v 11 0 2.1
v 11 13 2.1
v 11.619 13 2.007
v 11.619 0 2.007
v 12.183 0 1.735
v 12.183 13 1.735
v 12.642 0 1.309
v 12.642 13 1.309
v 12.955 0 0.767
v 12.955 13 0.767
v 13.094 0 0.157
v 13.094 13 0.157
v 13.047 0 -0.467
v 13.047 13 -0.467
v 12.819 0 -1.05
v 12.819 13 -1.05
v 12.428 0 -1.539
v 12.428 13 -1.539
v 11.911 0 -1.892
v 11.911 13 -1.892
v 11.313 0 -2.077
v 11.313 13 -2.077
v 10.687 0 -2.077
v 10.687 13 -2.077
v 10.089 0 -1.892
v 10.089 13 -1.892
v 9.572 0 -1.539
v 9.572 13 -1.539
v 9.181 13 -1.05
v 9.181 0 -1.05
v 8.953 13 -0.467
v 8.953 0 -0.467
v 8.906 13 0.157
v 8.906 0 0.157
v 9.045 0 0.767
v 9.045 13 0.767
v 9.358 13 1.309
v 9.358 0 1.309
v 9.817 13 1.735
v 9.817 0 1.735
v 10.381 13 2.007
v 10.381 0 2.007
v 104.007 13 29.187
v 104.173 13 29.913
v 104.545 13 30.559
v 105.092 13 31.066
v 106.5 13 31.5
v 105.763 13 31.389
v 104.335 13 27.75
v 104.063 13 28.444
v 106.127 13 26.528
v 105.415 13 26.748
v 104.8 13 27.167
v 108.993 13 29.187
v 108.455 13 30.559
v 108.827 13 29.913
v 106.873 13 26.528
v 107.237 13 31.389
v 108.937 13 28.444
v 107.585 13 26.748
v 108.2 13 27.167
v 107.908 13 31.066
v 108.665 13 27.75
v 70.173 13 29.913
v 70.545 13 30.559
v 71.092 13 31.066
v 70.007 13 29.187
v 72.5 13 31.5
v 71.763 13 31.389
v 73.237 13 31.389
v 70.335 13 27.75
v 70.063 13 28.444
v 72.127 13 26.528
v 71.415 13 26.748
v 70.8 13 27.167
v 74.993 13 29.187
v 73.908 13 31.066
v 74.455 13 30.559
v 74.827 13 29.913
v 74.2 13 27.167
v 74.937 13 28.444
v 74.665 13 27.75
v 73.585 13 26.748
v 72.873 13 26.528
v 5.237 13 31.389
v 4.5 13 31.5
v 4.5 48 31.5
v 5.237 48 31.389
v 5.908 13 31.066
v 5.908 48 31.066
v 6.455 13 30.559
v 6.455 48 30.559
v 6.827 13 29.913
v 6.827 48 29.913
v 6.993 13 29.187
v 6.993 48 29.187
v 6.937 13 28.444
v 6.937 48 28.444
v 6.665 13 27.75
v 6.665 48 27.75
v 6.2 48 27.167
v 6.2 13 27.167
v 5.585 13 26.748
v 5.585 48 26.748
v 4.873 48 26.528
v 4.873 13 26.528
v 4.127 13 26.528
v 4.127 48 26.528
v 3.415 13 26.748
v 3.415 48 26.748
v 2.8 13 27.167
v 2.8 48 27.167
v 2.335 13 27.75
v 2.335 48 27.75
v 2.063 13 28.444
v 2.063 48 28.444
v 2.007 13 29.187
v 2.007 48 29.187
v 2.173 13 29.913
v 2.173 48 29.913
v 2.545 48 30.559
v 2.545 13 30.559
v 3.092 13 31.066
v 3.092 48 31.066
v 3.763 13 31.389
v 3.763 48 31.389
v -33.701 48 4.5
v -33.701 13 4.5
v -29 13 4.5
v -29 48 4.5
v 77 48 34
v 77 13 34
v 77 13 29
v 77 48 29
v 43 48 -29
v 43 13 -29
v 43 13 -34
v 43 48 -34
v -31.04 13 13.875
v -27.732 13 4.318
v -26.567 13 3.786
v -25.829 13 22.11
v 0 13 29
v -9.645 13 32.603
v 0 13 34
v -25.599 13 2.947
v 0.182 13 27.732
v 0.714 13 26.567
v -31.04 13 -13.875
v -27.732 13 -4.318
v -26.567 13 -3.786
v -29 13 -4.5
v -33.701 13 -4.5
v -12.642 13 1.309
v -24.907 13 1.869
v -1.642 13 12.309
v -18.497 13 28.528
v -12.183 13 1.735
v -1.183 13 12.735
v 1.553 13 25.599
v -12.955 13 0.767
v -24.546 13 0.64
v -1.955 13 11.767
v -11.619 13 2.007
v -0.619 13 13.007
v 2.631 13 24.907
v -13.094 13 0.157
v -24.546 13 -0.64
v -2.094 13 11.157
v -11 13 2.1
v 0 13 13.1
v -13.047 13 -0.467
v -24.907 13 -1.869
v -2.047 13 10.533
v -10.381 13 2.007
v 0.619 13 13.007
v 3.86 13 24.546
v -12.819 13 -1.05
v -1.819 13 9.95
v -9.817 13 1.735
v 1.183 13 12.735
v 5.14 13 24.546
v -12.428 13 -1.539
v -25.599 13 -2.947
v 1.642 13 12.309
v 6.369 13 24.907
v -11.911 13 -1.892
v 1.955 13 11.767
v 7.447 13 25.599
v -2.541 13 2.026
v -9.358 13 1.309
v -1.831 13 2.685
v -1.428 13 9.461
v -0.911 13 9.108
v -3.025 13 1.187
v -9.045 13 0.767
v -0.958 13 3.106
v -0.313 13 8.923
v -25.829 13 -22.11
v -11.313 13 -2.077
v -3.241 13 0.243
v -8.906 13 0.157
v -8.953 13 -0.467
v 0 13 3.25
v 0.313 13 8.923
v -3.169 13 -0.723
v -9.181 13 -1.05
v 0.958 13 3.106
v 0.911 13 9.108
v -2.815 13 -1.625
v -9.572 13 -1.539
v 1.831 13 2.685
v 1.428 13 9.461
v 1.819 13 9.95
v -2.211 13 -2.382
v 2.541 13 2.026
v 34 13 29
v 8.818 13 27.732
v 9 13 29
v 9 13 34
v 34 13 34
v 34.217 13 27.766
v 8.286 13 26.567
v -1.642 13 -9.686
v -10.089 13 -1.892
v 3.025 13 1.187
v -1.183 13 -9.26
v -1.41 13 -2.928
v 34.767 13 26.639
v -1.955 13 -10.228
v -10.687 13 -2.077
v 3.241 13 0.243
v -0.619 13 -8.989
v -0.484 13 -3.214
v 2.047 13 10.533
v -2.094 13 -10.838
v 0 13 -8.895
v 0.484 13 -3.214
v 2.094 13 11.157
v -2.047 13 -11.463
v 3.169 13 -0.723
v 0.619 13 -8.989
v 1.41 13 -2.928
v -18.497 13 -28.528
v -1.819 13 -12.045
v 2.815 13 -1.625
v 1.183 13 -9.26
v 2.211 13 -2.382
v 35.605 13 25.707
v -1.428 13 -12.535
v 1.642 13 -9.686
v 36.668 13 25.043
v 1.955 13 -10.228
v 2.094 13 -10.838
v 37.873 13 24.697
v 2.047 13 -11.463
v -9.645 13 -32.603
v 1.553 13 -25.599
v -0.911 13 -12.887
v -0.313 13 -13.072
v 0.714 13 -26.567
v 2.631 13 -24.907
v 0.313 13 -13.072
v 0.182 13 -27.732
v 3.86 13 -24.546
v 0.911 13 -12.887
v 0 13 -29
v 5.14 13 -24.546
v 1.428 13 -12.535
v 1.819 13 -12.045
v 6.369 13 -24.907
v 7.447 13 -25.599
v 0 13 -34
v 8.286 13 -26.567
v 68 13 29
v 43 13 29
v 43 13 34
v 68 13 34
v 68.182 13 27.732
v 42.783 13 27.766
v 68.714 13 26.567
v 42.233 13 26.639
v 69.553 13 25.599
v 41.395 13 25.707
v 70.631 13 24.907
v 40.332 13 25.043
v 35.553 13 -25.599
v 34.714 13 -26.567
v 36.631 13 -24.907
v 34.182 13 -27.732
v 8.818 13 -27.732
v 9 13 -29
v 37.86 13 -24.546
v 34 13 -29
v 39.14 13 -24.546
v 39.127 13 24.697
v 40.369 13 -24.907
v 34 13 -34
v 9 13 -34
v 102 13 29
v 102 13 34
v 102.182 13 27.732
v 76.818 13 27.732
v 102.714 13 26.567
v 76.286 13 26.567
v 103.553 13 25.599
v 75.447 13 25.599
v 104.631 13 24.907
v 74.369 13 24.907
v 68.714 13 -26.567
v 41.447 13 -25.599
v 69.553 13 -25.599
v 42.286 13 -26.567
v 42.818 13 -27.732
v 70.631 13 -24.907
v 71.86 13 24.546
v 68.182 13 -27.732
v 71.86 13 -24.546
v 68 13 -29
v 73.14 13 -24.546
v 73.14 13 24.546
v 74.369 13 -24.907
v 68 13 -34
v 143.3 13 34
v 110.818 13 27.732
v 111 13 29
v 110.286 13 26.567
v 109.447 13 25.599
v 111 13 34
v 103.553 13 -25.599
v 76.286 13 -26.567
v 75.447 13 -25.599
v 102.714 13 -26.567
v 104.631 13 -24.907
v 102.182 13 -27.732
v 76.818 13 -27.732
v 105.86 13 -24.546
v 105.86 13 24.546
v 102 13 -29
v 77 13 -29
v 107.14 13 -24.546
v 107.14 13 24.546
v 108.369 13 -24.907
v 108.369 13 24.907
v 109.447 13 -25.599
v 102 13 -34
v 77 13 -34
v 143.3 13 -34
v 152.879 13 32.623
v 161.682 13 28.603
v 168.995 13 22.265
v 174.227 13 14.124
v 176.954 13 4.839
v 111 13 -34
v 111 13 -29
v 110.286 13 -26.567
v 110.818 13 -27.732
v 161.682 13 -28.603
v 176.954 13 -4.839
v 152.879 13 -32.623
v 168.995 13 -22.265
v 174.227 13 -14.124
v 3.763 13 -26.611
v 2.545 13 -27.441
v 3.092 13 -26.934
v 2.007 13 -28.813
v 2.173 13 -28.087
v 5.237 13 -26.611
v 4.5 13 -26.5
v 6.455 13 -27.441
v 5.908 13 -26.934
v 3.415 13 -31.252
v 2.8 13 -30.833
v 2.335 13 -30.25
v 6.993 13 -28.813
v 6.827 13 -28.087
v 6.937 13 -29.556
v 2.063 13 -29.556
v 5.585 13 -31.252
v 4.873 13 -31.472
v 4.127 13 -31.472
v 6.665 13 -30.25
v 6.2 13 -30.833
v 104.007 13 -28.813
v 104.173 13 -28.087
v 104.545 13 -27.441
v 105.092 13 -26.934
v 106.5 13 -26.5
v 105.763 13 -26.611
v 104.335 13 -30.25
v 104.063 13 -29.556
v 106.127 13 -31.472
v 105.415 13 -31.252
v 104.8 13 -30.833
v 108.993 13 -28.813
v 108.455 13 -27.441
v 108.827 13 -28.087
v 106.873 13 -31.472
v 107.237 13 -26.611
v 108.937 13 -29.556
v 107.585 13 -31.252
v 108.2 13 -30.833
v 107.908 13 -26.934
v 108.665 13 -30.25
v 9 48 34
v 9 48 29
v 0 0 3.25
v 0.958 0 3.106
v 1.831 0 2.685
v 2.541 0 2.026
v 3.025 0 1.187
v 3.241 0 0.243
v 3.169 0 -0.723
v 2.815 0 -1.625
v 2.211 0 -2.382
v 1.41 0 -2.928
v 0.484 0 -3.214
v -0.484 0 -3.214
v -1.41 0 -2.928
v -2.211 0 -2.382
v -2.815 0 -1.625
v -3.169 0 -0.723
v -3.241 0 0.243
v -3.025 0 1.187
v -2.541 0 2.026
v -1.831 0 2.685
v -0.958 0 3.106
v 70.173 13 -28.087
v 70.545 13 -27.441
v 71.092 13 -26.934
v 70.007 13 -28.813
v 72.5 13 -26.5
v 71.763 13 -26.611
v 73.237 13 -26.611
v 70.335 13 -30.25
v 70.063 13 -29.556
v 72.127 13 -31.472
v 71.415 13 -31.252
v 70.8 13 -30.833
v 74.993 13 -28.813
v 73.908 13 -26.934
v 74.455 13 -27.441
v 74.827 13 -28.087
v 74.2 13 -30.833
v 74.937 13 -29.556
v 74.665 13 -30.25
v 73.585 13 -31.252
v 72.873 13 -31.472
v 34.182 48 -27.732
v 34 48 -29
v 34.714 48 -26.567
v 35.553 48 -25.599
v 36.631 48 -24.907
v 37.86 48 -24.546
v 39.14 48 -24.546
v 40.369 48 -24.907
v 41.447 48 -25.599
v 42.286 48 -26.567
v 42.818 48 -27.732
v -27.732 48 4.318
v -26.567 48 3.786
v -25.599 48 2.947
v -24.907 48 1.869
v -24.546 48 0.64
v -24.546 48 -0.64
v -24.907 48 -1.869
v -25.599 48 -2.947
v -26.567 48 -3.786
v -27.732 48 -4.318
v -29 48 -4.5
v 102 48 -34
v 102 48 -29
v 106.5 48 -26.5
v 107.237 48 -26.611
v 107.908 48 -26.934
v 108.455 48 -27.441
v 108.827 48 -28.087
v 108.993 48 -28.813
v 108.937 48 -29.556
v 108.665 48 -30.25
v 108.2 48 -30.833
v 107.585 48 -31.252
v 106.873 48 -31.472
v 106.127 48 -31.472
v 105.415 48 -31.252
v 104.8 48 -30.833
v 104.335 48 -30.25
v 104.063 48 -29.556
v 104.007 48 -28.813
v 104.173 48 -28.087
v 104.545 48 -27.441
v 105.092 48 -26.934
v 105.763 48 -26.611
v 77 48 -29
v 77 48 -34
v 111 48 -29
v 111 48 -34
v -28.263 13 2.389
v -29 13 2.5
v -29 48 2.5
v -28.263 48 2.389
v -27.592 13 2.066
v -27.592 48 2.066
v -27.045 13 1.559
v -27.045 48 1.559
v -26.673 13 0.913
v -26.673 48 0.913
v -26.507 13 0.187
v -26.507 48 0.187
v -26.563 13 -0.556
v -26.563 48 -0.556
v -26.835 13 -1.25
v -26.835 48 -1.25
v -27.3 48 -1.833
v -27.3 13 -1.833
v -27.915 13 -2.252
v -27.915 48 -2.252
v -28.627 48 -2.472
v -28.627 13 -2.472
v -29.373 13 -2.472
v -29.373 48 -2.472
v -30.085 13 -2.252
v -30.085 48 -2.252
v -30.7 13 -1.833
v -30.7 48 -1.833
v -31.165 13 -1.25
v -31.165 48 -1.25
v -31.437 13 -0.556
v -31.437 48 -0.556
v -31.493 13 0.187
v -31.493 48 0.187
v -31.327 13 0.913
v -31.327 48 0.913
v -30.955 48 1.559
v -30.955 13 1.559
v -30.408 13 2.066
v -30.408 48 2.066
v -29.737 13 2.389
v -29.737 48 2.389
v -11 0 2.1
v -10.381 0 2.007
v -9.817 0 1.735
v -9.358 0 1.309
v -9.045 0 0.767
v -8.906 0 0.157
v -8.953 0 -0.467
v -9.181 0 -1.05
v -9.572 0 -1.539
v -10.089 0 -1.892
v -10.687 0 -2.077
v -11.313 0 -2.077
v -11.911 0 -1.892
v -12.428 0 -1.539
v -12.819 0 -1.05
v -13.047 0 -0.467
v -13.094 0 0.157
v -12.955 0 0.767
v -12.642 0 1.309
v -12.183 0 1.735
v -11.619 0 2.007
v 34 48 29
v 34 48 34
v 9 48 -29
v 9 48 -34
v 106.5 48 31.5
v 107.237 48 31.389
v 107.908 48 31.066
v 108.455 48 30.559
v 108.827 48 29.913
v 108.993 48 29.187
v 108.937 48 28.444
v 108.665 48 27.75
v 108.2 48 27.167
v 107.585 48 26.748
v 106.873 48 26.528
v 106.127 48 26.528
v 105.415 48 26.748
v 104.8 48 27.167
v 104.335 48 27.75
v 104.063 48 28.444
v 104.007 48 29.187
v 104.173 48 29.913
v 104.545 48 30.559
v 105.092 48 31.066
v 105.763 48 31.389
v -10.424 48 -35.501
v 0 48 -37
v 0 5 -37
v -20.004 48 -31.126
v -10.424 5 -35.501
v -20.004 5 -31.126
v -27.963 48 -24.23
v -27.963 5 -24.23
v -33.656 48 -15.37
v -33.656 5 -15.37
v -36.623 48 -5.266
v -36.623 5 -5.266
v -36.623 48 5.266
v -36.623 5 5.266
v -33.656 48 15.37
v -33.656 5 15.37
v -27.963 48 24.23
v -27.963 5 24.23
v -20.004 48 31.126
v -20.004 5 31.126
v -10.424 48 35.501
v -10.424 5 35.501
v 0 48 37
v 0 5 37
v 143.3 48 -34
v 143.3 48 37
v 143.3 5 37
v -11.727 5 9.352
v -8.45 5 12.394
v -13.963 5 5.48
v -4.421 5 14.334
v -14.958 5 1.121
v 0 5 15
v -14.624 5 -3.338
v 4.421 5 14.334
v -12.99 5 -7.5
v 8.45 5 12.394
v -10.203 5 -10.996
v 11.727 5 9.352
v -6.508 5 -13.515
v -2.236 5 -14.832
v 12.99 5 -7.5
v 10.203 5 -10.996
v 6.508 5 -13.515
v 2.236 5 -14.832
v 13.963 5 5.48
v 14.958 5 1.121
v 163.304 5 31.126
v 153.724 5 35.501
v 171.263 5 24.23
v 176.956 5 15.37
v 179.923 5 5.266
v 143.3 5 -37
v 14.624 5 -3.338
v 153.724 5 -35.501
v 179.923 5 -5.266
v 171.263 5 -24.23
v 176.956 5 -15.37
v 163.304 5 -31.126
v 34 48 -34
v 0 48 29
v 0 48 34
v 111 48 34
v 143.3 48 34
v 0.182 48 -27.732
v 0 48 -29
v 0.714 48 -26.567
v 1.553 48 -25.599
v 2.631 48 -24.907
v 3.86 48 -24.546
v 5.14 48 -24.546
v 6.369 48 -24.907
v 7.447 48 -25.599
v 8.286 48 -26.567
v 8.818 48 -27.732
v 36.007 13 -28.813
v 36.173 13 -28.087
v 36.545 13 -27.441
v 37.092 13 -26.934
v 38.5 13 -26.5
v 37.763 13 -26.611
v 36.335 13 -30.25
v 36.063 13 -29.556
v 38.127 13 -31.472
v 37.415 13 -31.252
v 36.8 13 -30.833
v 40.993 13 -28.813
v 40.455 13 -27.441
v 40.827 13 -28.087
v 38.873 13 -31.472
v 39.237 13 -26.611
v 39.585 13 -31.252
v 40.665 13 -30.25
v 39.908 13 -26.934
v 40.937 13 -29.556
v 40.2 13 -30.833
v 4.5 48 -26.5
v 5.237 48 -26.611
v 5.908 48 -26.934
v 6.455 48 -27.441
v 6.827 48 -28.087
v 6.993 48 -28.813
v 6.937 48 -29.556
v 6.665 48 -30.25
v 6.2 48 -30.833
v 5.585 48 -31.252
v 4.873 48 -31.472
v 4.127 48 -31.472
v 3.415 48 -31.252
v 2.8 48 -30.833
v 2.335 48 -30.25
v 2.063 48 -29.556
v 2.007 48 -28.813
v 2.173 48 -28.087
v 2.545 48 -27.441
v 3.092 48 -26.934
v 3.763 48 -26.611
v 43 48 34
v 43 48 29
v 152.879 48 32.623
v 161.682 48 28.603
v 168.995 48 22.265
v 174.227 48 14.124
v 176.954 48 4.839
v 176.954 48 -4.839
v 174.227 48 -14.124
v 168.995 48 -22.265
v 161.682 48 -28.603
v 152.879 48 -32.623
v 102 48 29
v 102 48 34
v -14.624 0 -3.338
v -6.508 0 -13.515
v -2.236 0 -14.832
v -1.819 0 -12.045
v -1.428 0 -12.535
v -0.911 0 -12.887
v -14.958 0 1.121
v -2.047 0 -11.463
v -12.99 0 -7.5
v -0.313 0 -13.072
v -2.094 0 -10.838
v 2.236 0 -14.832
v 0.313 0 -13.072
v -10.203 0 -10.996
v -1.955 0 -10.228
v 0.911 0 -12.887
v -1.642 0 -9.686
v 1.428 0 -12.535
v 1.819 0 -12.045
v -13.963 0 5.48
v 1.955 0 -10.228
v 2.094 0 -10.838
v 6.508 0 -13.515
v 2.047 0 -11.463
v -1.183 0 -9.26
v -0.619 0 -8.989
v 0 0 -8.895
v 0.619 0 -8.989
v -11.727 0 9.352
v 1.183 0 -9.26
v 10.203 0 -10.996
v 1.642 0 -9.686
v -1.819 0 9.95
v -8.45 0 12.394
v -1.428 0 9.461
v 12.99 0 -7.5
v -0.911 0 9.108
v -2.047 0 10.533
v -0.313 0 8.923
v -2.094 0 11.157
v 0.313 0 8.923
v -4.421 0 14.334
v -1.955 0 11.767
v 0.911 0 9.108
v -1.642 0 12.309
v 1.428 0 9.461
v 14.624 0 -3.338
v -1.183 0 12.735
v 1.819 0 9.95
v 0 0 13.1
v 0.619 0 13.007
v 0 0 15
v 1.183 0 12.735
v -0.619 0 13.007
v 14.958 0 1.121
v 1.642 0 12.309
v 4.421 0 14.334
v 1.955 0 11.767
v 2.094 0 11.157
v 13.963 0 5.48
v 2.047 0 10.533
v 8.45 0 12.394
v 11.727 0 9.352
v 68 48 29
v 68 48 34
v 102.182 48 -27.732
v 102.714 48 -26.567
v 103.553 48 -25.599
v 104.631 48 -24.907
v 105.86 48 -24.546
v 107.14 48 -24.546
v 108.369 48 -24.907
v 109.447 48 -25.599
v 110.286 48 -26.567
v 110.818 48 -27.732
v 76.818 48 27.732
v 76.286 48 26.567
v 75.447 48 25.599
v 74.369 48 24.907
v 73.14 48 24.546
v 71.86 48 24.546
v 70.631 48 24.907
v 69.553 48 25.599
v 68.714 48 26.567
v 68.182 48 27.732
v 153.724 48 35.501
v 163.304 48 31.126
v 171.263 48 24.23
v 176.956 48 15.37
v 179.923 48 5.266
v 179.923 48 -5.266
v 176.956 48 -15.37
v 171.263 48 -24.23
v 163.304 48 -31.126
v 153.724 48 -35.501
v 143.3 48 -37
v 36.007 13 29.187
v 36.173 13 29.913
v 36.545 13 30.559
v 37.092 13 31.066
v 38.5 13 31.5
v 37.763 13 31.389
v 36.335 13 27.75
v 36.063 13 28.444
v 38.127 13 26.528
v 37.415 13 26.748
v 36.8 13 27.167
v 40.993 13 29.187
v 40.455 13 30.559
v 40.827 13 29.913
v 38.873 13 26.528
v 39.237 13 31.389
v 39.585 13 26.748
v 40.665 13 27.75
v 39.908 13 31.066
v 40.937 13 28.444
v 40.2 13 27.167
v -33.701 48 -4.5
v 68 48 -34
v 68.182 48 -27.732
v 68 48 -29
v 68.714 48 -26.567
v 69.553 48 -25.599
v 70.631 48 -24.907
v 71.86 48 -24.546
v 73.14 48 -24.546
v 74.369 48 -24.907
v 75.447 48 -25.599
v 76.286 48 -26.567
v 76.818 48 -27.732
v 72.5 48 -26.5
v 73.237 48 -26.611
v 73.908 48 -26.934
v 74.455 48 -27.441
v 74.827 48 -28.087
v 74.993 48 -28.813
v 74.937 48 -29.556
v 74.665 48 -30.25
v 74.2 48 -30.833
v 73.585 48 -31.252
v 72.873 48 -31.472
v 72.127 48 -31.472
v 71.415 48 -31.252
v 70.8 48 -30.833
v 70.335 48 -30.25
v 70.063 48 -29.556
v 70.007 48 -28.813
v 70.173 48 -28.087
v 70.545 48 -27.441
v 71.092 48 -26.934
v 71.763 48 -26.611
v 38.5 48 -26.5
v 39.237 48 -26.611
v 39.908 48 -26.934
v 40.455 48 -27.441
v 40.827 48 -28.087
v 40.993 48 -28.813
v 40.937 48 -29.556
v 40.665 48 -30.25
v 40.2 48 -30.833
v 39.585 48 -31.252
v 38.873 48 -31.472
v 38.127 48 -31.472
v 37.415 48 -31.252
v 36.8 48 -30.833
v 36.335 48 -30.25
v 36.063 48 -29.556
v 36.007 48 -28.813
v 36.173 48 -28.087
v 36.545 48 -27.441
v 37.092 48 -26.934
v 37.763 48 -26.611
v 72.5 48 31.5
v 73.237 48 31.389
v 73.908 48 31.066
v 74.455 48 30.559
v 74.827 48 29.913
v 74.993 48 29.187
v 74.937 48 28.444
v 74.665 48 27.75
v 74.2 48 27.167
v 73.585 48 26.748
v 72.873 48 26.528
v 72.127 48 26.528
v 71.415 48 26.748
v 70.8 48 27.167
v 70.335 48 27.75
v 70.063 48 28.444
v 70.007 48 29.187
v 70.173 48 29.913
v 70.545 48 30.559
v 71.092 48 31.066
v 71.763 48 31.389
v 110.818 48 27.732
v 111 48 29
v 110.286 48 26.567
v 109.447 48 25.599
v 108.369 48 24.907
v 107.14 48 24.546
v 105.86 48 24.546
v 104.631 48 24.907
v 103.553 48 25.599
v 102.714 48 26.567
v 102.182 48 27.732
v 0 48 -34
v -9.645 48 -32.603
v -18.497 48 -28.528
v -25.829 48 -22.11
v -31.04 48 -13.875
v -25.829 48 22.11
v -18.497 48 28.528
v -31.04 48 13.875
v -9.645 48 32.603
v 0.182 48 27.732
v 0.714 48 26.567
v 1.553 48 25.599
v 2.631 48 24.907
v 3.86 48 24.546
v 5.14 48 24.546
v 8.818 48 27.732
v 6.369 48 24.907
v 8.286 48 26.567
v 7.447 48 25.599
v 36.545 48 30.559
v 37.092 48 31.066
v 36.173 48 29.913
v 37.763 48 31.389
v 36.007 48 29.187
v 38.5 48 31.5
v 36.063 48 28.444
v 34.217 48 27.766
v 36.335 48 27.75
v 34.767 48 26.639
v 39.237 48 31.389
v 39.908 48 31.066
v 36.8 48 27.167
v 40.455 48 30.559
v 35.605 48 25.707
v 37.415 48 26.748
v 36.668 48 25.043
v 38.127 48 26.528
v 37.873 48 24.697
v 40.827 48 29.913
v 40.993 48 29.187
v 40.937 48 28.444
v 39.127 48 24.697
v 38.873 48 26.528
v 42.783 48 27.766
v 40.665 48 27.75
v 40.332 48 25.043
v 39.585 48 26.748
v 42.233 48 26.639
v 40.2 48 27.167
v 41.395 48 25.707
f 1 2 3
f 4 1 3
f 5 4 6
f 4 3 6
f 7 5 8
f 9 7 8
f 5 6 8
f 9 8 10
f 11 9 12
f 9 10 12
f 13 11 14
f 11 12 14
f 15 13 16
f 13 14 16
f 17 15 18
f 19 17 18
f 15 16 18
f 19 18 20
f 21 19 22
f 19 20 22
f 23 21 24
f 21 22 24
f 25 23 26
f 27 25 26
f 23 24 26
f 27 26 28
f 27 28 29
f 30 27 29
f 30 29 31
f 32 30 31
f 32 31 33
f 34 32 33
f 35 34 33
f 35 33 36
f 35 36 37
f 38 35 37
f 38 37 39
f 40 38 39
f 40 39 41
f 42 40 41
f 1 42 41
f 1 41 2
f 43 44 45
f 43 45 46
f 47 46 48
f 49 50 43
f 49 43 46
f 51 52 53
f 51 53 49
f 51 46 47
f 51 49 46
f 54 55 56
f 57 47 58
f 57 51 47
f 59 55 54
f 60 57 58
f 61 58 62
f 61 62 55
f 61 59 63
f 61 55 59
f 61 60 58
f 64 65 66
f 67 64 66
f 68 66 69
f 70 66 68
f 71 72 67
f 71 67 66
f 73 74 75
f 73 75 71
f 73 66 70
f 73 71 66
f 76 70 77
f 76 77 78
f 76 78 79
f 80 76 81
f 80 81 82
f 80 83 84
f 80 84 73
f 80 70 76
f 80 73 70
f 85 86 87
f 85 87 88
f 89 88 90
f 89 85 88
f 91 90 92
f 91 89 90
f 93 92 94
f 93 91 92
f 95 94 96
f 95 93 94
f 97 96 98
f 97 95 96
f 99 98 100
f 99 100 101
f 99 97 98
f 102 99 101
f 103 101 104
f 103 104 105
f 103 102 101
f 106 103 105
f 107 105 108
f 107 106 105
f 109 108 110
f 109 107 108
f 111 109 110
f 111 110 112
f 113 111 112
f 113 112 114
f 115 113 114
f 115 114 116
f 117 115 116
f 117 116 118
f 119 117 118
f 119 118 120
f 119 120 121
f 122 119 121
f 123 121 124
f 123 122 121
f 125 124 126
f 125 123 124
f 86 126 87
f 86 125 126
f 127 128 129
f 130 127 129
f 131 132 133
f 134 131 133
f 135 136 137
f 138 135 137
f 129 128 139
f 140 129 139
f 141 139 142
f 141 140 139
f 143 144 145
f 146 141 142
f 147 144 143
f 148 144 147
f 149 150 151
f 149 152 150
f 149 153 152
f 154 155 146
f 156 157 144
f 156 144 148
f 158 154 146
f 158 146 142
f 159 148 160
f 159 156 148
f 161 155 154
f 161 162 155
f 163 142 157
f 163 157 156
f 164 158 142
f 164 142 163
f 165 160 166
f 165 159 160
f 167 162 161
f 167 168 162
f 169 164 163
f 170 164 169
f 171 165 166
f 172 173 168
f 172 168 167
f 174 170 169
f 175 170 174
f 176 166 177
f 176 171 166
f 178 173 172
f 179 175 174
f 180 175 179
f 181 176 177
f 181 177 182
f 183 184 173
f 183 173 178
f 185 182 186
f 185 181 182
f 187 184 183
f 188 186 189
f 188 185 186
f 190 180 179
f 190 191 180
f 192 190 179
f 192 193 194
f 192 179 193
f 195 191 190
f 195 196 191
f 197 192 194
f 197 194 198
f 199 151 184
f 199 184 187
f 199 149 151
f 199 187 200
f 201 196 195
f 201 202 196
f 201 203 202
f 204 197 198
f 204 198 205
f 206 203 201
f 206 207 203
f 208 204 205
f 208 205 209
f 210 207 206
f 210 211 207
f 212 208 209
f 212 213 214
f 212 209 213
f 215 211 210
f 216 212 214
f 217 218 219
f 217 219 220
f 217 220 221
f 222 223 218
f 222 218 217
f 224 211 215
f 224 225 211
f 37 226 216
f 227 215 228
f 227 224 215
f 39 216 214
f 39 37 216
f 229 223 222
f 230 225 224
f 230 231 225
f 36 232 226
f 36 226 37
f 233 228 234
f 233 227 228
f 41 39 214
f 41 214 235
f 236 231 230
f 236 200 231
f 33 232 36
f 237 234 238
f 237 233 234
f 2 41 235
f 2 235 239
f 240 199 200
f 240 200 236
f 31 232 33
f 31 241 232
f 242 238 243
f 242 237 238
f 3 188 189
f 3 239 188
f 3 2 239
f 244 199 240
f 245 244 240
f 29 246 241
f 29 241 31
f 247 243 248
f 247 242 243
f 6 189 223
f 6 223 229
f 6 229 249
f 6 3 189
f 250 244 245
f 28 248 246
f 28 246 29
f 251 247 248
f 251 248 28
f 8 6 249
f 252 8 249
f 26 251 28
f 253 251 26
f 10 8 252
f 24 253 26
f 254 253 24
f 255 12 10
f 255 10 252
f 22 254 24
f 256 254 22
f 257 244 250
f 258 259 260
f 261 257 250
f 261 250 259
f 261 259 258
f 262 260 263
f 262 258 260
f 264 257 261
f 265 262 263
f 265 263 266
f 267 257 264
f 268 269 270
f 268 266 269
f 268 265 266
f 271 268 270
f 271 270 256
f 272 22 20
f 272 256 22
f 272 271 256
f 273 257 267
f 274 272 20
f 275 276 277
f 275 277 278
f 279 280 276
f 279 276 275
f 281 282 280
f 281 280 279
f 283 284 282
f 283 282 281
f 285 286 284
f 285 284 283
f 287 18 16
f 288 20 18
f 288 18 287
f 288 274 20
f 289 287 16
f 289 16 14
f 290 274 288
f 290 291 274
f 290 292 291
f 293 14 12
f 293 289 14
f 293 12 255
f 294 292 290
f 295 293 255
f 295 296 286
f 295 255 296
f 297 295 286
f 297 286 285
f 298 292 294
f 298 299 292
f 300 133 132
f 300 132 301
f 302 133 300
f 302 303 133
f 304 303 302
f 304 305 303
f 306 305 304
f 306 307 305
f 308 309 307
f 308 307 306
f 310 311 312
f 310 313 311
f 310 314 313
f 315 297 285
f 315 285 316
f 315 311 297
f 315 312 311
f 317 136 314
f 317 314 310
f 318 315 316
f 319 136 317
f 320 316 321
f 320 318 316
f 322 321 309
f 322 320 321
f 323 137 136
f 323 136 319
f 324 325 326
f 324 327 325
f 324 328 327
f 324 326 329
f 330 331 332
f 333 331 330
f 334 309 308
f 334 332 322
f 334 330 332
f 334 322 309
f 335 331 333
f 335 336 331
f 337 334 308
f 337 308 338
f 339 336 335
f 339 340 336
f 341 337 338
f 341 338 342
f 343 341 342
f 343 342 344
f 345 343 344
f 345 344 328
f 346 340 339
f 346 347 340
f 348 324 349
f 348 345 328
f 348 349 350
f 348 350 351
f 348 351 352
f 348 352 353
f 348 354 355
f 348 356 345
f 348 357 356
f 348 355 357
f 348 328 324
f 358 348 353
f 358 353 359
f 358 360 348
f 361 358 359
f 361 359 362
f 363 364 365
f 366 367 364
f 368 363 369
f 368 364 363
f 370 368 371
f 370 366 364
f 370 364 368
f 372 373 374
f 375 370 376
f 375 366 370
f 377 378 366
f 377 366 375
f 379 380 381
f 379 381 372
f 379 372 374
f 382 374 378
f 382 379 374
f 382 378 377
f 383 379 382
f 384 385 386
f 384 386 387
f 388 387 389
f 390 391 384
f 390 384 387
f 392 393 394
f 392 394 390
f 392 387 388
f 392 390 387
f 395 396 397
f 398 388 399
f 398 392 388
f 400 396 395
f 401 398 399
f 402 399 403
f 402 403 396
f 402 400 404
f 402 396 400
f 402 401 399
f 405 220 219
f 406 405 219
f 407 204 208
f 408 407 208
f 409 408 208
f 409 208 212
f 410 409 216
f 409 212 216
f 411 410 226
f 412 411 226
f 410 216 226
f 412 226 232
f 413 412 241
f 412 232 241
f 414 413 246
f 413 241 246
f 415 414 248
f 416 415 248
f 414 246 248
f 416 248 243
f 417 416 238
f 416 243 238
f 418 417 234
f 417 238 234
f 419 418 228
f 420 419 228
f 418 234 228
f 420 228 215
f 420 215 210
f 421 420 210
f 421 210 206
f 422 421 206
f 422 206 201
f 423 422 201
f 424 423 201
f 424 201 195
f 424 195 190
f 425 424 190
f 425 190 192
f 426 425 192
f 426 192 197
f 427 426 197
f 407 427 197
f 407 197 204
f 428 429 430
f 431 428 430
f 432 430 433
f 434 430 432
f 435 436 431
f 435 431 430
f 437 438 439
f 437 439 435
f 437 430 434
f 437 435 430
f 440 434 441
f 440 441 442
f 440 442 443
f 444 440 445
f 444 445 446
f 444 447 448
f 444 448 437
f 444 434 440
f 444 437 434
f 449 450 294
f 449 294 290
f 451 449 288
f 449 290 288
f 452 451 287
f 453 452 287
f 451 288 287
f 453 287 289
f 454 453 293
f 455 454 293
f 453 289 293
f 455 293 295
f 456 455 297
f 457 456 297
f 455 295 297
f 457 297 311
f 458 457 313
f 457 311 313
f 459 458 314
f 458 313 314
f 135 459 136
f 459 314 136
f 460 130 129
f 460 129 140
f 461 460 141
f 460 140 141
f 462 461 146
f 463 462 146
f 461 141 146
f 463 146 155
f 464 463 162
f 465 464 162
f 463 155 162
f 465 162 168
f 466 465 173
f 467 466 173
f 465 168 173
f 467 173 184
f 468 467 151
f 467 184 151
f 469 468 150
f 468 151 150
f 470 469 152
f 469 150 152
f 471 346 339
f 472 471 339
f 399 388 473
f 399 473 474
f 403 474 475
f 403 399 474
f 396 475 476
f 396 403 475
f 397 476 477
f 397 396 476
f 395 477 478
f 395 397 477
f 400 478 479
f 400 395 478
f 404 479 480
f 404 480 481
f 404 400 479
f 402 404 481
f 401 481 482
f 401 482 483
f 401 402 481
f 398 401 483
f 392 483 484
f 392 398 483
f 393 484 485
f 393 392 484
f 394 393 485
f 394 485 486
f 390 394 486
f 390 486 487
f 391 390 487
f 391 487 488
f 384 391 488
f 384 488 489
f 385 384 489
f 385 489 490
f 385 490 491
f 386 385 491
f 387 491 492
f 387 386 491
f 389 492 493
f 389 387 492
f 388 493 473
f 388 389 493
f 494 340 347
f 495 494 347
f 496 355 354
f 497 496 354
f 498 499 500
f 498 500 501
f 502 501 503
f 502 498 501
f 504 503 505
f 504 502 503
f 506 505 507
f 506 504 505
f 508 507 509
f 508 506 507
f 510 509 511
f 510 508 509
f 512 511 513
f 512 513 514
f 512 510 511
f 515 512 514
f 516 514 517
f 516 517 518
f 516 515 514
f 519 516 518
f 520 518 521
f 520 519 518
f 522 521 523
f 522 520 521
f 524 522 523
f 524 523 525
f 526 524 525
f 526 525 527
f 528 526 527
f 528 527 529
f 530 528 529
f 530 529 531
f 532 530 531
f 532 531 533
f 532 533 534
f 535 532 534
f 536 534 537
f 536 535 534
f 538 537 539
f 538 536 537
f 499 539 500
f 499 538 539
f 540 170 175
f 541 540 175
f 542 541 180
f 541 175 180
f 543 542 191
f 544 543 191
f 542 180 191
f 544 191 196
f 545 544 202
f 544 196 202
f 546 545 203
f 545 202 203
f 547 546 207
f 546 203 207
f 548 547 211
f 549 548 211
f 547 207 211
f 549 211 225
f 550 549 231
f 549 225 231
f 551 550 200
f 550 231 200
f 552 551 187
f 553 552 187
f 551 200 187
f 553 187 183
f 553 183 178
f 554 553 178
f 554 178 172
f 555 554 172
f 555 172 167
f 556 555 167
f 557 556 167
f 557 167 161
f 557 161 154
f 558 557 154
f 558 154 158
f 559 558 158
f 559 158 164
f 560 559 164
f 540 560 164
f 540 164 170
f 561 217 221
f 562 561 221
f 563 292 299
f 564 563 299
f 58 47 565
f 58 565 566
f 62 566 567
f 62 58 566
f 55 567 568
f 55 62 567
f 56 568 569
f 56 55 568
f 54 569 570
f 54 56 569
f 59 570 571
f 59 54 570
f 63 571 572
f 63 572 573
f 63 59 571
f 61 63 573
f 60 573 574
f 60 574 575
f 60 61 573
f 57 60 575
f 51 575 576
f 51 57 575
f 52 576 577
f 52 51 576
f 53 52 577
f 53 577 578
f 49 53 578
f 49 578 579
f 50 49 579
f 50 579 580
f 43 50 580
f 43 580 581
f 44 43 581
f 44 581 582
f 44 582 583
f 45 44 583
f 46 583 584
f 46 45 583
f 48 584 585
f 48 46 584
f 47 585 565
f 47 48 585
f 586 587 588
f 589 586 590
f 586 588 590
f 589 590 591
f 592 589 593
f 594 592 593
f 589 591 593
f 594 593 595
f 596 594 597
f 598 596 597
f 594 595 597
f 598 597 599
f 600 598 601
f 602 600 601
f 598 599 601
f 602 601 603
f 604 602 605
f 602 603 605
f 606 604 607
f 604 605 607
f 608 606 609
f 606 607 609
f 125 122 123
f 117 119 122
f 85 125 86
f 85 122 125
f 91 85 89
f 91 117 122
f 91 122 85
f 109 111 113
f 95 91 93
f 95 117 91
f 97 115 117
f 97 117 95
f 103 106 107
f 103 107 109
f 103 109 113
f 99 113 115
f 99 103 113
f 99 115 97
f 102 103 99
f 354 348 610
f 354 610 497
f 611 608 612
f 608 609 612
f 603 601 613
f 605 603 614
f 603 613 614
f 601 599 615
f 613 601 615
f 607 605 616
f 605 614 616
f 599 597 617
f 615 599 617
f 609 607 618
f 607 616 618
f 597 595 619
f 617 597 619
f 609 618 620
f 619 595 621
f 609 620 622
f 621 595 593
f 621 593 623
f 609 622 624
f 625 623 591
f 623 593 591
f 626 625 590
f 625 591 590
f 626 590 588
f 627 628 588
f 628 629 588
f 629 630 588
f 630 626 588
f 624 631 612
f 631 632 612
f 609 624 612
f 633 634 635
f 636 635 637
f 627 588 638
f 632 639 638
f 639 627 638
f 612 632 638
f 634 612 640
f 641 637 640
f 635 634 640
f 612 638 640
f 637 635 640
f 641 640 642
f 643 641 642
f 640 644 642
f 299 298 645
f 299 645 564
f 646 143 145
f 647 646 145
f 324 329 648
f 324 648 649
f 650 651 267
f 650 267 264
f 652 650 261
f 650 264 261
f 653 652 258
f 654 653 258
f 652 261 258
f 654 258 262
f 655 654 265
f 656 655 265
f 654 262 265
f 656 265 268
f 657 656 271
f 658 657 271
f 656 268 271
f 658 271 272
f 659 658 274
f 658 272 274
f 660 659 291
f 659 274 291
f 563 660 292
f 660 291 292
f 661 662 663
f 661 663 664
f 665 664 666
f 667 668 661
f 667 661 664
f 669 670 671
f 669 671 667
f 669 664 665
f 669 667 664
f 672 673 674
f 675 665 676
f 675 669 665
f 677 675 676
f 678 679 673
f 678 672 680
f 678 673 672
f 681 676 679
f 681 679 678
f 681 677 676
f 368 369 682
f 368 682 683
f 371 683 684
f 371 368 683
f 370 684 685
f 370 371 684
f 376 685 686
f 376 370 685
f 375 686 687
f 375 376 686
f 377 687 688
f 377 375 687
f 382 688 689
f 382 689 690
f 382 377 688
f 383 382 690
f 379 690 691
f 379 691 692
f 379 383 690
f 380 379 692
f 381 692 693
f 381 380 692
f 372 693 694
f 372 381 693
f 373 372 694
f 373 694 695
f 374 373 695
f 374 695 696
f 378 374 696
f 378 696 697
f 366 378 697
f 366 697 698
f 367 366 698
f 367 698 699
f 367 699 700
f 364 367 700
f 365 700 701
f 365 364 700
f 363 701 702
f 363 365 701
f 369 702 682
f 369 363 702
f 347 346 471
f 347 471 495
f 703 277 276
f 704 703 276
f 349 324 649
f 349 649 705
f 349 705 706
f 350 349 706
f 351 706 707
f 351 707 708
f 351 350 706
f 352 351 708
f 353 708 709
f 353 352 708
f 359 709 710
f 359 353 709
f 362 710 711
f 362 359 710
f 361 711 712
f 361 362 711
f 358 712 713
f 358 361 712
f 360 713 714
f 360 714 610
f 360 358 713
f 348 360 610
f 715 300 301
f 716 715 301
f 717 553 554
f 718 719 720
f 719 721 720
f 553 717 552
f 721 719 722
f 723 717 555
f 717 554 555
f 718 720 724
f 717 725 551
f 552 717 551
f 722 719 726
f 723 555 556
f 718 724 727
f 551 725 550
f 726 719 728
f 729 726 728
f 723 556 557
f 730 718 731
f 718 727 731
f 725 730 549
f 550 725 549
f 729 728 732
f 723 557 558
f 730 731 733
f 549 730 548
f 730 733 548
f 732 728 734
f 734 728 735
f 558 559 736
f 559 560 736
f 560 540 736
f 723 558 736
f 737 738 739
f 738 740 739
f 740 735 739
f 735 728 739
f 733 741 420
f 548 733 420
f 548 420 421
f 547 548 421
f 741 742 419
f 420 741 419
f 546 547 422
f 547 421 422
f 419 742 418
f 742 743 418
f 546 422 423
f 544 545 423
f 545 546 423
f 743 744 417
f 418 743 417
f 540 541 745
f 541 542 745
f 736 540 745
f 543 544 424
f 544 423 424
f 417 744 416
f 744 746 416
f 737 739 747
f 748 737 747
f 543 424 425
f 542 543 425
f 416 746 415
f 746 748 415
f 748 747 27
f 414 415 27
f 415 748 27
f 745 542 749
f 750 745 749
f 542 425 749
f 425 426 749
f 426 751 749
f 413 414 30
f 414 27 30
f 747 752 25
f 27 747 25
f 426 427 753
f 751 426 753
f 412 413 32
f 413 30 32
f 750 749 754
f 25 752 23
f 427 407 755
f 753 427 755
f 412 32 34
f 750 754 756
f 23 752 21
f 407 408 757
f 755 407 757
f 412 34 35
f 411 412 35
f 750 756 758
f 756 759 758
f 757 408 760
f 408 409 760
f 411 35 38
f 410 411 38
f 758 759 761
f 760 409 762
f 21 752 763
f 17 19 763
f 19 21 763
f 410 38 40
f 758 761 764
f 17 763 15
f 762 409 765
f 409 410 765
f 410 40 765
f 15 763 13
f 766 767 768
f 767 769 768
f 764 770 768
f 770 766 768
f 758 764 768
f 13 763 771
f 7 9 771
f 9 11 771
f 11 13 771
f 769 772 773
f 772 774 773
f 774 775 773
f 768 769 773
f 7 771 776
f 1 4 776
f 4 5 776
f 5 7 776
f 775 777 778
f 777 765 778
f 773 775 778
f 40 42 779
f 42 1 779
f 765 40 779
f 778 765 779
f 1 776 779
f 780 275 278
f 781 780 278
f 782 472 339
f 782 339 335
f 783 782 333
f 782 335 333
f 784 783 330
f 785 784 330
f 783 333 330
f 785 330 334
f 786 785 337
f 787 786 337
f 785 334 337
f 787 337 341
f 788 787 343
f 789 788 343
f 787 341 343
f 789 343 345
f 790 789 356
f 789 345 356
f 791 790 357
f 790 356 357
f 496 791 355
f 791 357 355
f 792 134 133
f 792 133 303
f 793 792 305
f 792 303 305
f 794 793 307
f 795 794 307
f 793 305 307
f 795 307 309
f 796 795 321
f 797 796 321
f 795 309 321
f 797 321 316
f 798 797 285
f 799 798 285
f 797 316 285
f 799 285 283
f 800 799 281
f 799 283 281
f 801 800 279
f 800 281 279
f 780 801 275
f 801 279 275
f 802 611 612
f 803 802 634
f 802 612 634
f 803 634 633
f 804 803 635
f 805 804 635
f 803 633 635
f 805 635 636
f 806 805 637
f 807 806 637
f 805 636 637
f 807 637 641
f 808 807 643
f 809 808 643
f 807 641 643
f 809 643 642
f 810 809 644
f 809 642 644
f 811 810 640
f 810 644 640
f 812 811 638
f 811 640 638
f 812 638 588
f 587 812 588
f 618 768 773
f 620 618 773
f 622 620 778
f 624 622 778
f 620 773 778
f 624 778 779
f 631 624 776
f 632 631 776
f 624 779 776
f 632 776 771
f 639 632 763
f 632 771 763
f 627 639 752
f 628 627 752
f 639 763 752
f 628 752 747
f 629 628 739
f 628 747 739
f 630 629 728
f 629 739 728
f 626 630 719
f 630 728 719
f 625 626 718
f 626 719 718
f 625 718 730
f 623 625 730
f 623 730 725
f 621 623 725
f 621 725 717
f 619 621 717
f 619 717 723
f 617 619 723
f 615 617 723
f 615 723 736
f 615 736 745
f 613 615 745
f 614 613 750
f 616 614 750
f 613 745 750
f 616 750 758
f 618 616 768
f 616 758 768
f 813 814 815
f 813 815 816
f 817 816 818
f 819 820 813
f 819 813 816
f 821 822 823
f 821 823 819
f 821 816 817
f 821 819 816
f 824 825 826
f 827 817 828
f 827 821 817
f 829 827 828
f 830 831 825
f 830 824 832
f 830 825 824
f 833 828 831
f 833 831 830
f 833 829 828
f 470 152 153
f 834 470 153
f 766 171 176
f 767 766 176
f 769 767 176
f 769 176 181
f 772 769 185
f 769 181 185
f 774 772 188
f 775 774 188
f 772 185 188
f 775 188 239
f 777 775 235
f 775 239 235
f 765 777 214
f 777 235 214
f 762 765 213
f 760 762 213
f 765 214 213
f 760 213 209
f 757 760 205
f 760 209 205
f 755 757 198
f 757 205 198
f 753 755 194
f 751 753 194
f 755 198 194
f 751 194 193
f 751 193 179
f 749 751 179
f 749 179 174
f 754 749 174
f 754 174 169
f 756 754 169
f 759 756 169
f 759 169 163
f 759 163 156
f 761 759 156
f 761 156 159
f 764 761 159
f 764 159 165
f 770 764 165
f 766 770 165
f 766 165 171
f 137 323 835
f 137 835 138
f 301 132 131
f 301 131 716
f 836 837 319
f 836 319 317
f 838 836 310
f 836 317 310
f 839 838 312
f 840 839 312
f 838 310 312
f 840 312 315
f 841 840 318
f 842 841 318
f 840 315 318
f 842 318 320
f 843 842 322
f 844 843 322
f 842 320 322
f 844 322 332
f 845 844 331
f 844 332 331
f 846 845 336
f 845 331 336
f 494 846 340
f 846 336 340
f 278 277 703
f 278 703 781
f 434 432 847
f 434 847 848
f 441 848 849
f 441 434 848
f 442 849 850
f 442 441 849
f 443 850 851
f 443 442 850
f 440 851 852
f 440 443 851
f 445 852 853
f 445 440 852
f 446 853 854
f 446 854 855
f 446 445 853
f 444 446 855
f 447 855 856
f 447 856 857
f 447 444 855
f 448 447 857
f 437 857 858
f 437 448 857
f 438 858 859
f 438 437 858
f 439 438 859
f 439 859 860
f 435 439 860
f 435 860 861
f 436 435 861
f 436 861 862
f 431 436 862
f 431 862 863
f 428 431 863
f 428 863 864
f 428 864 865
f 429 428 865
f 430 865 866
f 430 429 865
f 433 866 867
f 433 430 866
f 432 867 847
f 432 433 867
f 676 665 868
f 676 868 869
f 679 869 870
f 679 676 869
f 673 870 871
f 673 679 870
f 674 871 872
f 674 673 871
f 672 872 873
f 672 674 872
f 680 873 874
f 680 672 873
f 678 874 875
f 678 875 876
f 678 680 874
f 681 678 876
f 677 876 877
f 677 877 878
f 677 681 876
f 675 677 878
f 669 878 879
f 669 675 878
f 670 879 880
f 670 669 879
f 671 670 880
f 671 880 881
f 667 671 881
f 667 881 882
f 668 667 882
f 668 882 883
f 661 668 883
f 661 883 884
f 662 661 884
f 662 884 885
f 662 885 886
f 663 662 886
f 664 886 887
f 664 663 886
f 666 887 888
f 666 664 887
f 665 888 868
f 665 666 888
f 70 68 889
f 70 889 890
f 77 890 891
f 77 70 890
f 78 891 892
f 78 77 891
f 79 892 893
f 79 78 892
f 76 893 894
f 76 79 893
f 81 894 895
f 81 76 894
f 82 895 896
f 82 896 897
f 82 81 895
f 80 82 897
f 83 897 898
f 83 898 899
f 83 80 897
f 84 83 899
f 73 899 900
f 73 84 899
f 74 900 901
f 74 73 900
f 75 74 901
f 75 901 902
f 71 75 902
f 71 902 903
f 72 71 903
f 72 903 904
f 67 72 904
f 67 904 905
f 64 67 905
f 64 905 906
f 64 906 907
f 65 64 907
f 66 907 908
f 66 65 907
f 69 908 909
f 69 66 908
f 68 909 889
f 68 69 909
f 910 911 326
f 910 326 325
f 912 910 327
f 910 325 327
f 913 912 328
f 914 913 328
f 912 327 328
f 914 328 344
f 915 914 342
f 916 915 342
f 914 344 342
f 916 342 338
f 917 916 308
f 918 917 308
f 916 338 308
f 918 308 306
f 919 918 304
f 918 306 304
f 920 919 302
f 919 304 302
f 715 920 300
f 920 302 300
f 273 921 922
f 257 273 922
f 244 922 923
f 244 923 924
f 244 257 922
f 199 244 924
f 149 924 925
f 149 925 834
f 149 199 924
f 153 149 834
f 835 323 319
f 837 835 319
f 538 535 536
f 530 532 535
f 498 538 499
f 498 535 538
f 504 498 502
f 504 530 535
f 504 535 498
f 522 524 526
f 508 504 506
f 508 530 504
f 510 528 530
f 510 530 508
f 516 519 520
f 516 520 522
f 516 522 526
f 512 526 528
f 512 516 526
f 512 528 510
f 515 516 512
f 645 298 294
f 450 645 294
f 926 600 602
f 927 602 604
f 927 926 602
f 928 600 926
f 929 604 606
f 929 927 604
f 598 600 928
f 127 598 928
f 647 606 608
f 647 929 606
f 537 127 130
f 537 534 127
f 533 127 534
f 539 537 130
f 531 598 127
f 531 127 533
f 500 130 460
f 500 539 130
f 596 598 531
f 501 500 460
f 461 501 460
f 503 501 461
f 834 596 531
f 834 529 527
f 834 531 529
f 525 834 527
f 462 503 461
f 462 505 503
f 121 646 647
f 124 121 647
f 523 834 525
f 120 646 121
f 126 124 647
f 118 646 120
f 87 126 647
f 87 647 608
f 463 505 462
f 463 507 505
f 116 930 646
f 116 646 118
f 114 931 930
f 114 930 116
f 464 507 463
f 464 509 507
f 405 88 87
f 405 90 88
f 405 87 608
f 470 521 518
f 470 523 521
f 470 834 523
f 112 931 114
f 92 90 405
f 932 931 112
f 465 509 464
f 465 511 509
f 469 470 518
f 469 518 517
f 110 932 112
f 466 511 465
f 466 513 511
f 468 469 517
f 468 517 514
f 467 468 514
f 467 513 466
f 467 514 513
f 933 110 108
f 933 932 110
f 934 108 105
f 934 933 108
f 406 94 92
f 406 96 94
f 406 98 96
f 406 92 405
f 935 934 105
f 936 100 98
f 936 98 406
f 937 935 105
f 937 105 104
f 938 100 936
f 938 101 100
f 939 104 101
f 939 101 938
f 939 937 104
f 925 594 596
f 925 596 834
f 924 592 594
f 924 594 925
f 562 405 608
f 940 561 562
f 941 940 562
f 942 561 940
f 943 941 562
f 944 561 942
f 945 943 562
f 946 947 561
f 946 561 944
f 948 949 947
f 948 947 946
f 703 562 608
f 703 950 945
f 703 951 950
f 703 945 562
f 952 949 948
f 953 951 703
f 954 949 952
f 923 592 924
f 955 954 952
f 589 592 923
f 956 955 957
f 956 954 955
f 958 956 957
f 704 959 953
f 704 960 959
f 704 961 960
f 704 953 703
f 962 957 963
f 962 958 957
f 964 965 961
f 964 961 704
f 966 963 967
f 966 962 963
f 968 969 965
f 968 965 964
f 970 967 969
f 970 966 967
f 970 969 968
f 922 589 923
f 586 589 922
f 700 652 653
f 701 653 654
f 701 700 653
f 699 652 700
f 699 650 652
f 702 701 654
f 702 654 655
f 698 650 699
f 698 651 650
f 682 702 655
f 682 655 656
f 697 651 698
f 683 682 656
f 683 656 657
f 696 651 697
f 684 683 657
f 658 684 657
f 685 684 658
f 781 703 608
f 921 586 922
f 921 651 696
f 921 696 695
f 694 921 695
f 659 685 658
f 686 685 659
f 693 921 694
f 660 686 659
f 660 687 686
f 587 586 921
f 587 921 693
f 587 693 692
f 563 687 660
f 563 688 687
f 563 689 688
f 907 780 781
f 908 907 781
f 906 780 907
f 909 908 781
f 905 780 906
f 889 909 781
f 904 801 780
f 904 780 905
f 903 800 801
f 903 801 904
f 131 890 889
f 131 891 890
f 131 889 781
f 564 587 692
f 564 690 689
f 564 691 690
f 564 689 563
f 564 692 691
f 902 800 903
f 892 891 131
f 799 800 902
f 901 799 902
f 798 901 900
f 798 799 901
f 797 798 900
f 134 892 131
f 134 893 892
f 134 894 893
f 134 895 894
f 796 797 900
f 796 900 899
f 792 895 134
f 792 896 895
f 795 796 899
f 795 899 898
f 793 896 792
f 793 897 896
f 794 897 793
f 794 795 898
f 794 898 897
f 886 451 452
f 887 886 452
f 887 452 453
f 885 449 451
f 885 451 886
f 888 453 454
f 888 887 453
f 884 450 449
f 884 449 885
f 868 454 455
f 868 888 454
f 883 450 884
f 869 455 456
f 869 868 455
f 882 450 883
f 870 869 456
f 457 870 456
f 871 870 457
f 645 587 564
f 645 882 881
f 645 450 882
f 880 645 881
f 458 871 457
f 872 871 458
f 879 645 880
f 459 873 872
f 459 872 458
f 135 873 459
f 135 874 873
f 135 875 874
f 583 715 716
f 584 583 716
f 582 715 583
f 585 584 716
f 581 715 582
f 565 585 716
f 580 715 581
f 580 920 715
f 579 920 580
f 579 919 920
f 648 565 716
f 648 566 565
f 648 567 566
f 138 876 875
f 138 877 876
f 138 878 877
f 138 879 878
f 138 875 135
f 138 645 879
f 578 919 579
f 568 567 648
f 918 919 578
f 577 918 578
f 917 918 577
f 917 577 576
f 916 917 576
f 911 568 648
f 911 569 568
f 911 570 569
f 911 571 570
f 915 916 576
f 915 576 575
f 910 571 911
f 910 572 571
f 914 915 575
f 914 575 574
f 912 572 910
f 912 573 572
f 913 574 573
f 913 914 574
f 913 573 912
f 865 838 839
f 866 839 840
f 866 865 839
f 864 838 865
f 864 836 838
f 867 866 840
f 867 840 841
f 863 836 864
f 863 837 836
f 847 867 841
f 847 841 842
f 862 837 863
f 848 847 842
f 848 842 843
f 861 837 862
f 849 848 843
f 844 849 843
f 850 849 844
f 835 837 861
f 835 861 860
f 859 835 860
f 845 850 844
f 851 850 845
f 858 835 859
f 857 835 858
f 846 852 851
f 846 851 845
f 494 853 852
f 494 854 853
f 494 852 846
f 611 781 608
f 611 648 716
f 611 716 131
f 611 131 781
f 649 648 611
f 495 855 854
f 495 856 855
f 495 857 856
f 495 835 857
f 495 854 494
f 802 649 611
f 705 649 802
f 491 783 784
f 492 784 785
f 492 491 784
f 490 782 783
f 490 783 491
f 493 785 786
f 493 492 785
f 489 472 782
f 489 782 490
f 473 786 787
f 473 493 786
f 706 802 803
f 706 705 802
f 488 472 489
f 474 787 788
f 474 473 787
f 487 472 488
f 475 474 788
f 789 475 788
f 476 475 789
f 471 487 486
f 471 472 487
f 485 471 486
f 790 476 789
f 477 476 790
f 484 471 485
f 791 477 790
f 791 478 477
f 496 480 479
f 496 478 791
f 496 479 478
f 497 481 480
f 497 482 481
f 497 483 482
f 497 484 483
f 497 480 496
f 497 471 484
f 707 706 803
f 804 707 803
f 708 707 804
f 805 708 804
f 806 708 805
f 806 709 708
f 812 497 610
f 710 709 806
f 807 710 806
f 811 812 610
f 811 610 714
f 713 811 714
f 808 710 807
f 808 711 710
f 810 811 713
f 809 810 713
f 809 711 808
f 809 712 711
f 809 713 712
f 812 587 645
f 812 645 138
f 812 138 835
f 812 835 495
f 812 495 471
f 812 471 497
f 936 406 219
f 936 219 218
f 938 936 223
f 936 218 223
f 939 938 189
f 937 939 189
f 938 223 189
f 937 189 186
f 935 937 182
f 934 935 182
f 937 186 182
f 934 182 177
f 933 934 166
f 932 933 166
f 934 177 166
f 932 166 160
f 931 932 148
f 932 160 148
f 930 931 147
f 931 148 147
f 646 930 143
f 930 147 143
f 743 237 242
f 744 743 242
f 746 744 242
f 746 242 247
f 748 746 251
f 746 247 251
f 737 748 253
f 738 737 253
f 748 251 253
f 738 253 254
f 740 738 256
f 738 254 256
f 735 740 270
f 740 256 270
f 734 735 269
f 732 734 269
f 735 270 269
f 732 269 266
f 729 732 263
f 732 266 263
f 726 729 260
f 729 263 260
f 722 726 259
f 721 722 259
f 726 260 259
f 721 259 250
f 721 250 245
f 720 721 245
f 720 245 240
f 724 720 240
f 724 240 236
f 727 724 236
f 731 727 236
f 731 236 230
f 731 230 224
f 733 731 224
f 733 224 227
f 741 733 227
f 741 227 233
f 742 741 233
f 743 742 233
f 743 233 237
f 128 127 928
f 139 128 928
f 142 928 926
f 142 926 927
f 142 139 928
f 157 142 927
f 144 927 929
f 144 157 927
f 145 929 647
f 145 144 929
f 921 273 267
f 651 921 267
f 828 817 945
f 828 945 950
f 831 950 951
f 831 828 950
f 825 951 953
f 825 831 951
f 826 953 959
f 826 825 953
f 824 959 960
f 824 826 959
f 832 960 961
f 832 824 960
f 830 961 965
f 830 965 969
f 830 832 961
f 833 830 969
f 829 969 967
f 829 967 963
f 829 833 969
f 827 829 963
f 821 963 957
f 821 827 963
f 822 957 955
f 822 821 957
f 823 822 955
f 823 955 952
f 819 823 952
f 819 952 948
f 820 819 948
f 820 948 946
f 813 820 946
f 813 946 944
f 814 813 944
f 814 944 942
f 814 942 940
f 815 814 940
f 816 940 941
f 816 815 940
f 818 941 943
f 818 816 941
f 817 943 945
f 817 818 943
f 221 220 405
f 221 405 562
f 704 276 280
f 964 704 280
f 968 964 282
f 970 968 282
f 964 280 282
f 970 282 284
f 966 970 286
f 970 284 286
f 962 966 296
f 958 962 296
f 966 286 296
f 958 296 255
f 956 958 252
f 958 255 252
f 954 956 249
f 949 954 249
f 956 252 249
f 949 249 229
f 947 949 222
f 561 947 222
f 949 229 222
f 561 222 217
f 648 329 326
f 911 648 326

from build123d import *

# Parameters (mm, degrees)
SKETCH1_R           = 15
BOSS_EXTRUDE1_DEPTH = 5
BOSS_EXTRUDE2_DEPTH = 8
BOSS_EXTRUDE3_DEPTH = 35
SKETCH4_R           = 2.1
SKETCH4_R_2         = 3.25
CUT_EXTRUDE1_DEPTH  = 35
SKETCH5_R           = 2.5
BOSS_EXTRUDE4_DEPTH = 35


with BuildPart() as part:
    # Sketch1 → Boss-Extrude1 (new body)
    with BuildSketch(Plane(origin=(0, 0, 0), x_dir=(1, 0, 0), z_dir=(0, 1, 0))):
        with Locations(Location((0, 0, 0), (0, 0, 270))):
            Circle(SKETCH1_R)
    extrude(amount=BOSS_EXTRUDE1_DEPTH)

    # Sketch2 → Boss-Extrude2 (add)
    with BuildSketch(Plane(origin=(0, 5, 0), x_dir=(1, 0, 0), z_dir=(0, 1, 0))):
        with BuildLine():
            Line((0, -37), (143.3, -37))
            ThreePointArc((143.3, -37), (180.3, 0), (143.3, 37))
            Line((143.3, 37), (0, 37))
            ThreePointArc((0, 37), (-37, 0), (0, -37))
        make_face()
    extrude(amount=BOSS_EXTRUDE2_DEPTH)

    # Sketch3 → Boss-Extrude3 (add)
    with BuildSketch(Plane(origin=(0, 13, 0), x_dir=(1, 0, 0), z_dir=(0, 1, 0))):
        with BuildLine():
            Line((143.3, 37), (0, 37))
            ThreePointArc((0, 37), (-37, 0), (0, -37))
            Line((0, -37), (143.3, -37))
            ThreePointArc((143.3, -37), (180.3, 0), (143.3, 37))
        make_face()
        with BuildLine():
            ThreePointArc((0, 34), (-34, 0), (0, -34))
            Line((0, -34), (143.3, -34))
            ThreePointArc((143.3, -34), (177.3, 0), (143.3, 34))
            Line((143.3, 34), (0, 34))
        make_face(mode=Mode.SUBTRACT)
    extrude(amount=BOSS_EXTRUDE3_DEPTH)

    # Sketch4 → Cut-Extrude1 (cut)
    with BuildSketch(Plane(origin=(0, 13, 0), x_dir=(1, 0, 0), z_dir=(0, 1, 0))):
        with Locations(Location((-11, 0, 0), (0, 0, 270))):
            Circle(SKETCH4_R)
        with Locations(Location((0, 0, 0), (0, 0, 270))):
            Circle(SKETCH4_R_2)
        with Locations(Location((0, 10.995299238, 0), (0, 0, 270))):
            Circle(SKETCH4_R)
        with Locations(Location((11, 0, 0), (0, 0, 270))):
            Circle(SKETCH4_R)
        with Locations(Location((0, -11, 0), (0, 0, 270))):
            Circle(SKETCH4_R)
    extrude(amount=-CUT_EXTRUDE1_DEPTH, mode=Mode.SUBTRACT)

    # Sketch5 → Boss-Extrude4 (add)
    # profile 1 of 9: a face of its own
    with BuildSketch(Plane(origin=(0, 13, 0), x_dir=(1, 0, 0), z_dir=(0, 1, 0))):
        with BuildLine():
            Line((-29, 4.5), (-33.700890196, 4.5))
            ThreePointArc((-33.700890196, 4.5), (-34, 0), (-33.700890196, -4.5))
            Line((-33.700890196, -4.5), (-29, -4.5))
            ThreePointArc((-29, -4.5), (-24.5, 0), (-29, 4.5))
        make_face()
        with Locations(Location((-29, 0, 0), (0, 0, 270))):
            Circle(SKETCH5_R, mode=Mode.SUBTRACT)
    # profile 2 of 9: a face of its own
    with BuildSketch(Plane(origin=(0, 13, 0), x_dir=(1, 0, 0), z_dir=(0, 1, 0))):
        with BuildLine():
            Line((9, 34), (0, 34))
            Line((0, 34), (0, 29))
            ThreePointArc((0, 29), (4.5, 24.5), (9, 29))
            Line((9, 29), (9, 34))
        make_face()
        with Locations(Location((4.5, 29, 0), (0, 0, 270))):
            Circle(SKETCH5_R, mode=Mode.SUBTRACT)
    # profile 3 of 9: a face of its own
    with BuildSketch(Plane(origin=(0, 13, 0), x_dir=(1, 0, 0), z_dir=(0, 1, 0))):
        with BuildLine():
            Line((43, 34), (34, 34))
            Line((34, 34), (34, 29))
            ThreePointArc((34, 29), (38.5, 24.5), (43, 29))
            Line((43, 29), (43, 34))
        make_face()
        with Locations(Location((38.5, 29, 0), (0, 0, 270))):
            Circle(SKETCH5_R, mode=Mode.SUBTRACT)
    # profile 4 of 9: a face of its own
    with BuildSketch(Plane(origin=(0, 13, 0), x_dir=(1, 0, 0), z_dir=(0, 1, 0))):
        with BuildLine():
            Line((77, 34), (68, 34))
            Line((68, 34), (68, 29))
            ThreePointArc((68, 29), (72.5, 24.5), (77, 29))
            Line((77, 29), (77, 34))
        make_face()
        with Locations(Location((72.5, 29, 0), (0, 0, 270))):
            Circle(SKETCH5_R, mode=Mode.SUBTRACT)
    # profile 5 of 9: a face of its own
    with BuildSketch(Plane(origin=(0, 13, 0), x_dir=(1, 0, 0), z_dir=(0, 1, 0))):
        with BuildLine():
            Line((68, -29), (68, -34))
            Line((68, -34), (77, -34))
            Line((77, -34), (77, -29))
            ThreePointArc((77, -29), (72.5, -24.5), (68, -29))
        make_face()
        with Locations(Location((72.5, -29, 0), (0, 0, 270))):
            Circle(SKETCH5_R, mode=Mode.SUBTRACT)
    # profile 6 of 9: a face of its own
    with BuildSketch(Plane(origin=(0, 13, 0), x_dir=(1, 0, 0), z_dir=(0, 1, 0))):
        with BuildLine():
            Line((34, -29), (34, -34))
            Line((34, -34), (43, -34))
            Line((43, -34), (43, -29))
            ThreePointArc((43, -29), (38.5, -24.653460046), (34, -29))
        make_face()
        with Locations(Location((38.5, -29, 0), (0, 0, 270))):
            Circle(SKETCH5_R, mode=Mode.SUBTRACT)
    # profile 7 of 9: a face of its own
    with BuildSketch(Plane(origin=(0, 13, 0), x_dir=(1, 0, 0), z_dir=(0, 1, 0))):
        with BuildLine():
            Line((0, -29), (0, -34))
            Line((0, -34), (9, -34))
            Line((9, -34), (9, -29))
            ThreePointArc((9, -29), (4.5, -24.5), (0, -29))
        make_face()
        with Locations(Location((4.5, -29, 0), (0, 0, 270))):
            Circle(SKETCH5_R, mode=Mode.SUBTRACT)
    # profile 8 of 9: a face of its own
    with BuildSketch(Plane(origin=(0, 13, 0), x_dir=(1, 0, 0), z_dir=(0, 1, 0))):
        with BuildLine():
            Line((111, 34), (102, 34))
            Line((102, 34), (102, 29))
            ThreePointArc((102, 29), (106.5, 24.5), (111, 29))
            Line((111, 29), (111, 34))
        make_face()
        with Locations(Location((106.5, 29, 0), (0, 0, 270))):
            Circle(SKETCH5_R, mode=Mode.SUBTRACT)
    # profile 9 of 9: a face of its own
    with BuildSketch(Plane(origin=(0, 13, 0), x_dir=(1, 0, 0), z_dir=(0, 1, 0))):
        with BuildLine():
            Line((102, -29), (102, -34))
            Line((102, -34), (111, -34))
            Line((111, -34), (111, -29))
            ThreePointArc((111, -29), (106.5, -24.5), (102, -29))
        make_face()
        with Locations(Location((106.5, -29, 0), (0, 0, 270))):
            Circle(SKETCH5_R, mode=Mode.SUBTRACT)
    extrude(amount=BOSS_EXTRUDE4_DEPTH)


solid = part.part
